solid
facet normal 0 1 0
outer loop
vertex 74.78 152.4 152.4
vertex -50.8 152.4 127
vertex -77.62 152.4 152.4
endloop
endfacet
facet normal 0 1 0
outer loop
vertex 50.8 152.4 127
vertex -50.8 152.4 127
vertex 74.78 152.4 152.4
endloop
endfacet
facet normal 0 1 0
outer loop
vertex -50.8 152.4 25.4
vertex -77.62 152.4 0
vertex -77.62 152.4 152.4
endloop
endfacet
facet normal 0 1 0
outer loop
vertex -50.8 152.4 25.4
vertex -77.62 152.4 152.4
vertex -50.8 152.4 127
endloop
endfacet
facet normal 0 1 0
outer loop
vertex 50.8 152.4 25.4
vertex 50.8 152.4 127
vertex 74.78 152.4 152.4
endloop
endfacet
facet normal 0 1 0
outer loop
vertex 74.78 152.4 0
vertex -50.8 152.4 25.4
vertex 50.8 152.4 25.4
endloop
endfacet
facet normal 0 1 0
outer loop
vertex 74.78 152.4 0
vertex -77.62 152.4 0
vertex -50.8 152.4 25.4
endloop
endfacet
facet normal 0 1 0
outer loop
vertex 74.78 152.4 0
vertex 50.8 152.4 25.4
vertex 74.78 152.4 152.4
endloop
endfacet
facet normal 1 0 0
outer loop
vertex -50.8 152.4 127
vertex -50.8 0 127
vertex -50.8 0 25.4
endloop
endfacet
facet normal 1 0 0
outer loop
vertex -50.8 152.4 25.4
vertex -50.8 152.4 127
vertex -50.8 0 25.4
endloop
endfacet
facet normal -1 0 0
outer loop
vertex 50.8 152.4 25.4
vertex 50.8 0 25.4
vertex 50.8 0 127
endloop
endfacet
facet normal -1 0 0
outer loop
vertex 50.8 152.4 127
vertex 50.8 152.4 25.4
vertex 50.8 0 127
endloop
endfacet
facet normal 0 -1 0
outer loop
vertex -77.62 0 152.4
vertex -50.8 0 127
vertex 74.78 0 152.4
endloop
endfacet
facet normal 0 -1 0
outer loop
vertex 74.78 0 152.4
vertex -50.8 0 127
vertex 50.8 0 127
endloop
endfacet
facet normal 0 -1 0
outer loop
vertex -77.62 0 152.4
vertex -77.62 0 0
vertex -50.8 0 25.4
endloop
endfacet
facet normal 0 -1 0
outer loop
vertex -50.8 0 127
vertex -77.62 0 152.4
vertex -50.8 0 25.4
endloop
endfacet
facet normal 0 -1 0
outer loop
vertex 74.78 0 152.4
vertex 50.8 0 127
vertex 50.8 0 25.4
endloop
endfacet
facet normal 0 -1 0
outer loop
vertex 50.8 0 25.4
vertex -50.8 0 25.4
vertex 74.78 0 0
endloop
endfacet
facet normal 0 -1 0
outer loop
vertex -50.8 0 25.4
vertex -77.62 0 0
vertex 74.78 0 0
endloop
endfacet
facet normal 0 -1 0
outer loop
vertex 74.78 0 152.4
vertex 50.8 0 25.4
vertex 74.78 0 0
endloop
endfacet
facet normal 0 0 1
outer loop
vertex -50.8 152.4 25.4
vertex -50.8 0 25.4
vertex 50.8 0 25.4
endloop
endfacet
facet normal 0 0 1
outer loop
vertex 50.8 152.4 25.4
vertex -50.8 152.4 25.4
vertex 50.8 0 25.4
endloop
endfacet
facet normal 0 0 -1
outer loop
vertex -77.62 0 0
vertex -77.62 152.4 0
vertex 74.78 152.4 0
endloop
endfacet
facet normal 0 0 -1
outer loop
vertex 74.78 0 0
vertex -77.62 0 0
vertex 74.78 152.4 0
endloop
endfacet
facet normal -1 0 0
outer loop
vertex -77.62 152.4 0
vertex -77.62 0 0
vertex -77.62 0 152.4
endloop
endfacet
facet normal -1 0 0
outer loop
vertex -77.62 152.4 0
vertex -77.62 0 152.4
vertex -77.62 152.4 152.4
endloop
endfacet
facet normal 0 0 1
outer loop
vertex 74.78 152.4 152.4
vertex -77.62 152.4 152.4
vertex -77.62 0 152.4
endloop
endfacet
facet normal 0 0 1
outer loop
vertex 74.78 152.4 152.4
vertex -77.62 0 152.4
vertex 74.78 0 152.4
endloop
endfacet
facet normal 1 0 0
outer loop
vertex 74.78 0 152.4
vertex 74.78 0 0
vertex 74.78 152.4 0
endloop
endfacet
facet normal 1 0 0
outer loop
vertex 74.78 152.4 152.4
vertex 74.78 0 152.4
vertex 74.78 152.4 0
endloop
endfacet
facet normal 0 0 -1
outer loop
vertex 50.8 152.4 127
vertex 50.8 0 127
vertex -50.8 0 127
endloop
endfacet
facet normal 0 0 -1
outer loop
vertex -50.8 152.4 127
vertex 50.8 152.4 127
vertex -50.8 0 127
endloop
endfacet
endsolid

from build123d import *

# Parameters (mm, degrees)
F0_W     = 152.4
F0_H     = 152.4
F1_DEPTH = 152.4
F2_W     = 50.8
F2_H     = 50.8
F3_DEPTH = 152.4


with BuildPart() as f1:
    # F0 (on Top) → F1 (new body)
    with BuildSketch(Plane.XY):
        with Locations((-1.420007, 76.2)):
            Rectangle(F0_W, F0_H)
    extrude(amount=F1_DEPTH)

    # F2 (on face) → F3 (cut)
    with BuildSketch(Plane.XZ):
        with Locations((-25.4, 101.6)):
            Rectangle(F2_W, F2_H)
        with Locations((25.4, 101.6)):
            Rectangle(F2_W, F2_H)
        with Locations((25.4, 50.8)):
            Rectangle(F2_W, F2_H)
        with Locations((-25.4, 50.8)):
            Rectangle(F2_W, F2_H)
    extrude(amount=-F3_DEPTH, mode=Mode.SUBTRACT)


solid = f1.part
